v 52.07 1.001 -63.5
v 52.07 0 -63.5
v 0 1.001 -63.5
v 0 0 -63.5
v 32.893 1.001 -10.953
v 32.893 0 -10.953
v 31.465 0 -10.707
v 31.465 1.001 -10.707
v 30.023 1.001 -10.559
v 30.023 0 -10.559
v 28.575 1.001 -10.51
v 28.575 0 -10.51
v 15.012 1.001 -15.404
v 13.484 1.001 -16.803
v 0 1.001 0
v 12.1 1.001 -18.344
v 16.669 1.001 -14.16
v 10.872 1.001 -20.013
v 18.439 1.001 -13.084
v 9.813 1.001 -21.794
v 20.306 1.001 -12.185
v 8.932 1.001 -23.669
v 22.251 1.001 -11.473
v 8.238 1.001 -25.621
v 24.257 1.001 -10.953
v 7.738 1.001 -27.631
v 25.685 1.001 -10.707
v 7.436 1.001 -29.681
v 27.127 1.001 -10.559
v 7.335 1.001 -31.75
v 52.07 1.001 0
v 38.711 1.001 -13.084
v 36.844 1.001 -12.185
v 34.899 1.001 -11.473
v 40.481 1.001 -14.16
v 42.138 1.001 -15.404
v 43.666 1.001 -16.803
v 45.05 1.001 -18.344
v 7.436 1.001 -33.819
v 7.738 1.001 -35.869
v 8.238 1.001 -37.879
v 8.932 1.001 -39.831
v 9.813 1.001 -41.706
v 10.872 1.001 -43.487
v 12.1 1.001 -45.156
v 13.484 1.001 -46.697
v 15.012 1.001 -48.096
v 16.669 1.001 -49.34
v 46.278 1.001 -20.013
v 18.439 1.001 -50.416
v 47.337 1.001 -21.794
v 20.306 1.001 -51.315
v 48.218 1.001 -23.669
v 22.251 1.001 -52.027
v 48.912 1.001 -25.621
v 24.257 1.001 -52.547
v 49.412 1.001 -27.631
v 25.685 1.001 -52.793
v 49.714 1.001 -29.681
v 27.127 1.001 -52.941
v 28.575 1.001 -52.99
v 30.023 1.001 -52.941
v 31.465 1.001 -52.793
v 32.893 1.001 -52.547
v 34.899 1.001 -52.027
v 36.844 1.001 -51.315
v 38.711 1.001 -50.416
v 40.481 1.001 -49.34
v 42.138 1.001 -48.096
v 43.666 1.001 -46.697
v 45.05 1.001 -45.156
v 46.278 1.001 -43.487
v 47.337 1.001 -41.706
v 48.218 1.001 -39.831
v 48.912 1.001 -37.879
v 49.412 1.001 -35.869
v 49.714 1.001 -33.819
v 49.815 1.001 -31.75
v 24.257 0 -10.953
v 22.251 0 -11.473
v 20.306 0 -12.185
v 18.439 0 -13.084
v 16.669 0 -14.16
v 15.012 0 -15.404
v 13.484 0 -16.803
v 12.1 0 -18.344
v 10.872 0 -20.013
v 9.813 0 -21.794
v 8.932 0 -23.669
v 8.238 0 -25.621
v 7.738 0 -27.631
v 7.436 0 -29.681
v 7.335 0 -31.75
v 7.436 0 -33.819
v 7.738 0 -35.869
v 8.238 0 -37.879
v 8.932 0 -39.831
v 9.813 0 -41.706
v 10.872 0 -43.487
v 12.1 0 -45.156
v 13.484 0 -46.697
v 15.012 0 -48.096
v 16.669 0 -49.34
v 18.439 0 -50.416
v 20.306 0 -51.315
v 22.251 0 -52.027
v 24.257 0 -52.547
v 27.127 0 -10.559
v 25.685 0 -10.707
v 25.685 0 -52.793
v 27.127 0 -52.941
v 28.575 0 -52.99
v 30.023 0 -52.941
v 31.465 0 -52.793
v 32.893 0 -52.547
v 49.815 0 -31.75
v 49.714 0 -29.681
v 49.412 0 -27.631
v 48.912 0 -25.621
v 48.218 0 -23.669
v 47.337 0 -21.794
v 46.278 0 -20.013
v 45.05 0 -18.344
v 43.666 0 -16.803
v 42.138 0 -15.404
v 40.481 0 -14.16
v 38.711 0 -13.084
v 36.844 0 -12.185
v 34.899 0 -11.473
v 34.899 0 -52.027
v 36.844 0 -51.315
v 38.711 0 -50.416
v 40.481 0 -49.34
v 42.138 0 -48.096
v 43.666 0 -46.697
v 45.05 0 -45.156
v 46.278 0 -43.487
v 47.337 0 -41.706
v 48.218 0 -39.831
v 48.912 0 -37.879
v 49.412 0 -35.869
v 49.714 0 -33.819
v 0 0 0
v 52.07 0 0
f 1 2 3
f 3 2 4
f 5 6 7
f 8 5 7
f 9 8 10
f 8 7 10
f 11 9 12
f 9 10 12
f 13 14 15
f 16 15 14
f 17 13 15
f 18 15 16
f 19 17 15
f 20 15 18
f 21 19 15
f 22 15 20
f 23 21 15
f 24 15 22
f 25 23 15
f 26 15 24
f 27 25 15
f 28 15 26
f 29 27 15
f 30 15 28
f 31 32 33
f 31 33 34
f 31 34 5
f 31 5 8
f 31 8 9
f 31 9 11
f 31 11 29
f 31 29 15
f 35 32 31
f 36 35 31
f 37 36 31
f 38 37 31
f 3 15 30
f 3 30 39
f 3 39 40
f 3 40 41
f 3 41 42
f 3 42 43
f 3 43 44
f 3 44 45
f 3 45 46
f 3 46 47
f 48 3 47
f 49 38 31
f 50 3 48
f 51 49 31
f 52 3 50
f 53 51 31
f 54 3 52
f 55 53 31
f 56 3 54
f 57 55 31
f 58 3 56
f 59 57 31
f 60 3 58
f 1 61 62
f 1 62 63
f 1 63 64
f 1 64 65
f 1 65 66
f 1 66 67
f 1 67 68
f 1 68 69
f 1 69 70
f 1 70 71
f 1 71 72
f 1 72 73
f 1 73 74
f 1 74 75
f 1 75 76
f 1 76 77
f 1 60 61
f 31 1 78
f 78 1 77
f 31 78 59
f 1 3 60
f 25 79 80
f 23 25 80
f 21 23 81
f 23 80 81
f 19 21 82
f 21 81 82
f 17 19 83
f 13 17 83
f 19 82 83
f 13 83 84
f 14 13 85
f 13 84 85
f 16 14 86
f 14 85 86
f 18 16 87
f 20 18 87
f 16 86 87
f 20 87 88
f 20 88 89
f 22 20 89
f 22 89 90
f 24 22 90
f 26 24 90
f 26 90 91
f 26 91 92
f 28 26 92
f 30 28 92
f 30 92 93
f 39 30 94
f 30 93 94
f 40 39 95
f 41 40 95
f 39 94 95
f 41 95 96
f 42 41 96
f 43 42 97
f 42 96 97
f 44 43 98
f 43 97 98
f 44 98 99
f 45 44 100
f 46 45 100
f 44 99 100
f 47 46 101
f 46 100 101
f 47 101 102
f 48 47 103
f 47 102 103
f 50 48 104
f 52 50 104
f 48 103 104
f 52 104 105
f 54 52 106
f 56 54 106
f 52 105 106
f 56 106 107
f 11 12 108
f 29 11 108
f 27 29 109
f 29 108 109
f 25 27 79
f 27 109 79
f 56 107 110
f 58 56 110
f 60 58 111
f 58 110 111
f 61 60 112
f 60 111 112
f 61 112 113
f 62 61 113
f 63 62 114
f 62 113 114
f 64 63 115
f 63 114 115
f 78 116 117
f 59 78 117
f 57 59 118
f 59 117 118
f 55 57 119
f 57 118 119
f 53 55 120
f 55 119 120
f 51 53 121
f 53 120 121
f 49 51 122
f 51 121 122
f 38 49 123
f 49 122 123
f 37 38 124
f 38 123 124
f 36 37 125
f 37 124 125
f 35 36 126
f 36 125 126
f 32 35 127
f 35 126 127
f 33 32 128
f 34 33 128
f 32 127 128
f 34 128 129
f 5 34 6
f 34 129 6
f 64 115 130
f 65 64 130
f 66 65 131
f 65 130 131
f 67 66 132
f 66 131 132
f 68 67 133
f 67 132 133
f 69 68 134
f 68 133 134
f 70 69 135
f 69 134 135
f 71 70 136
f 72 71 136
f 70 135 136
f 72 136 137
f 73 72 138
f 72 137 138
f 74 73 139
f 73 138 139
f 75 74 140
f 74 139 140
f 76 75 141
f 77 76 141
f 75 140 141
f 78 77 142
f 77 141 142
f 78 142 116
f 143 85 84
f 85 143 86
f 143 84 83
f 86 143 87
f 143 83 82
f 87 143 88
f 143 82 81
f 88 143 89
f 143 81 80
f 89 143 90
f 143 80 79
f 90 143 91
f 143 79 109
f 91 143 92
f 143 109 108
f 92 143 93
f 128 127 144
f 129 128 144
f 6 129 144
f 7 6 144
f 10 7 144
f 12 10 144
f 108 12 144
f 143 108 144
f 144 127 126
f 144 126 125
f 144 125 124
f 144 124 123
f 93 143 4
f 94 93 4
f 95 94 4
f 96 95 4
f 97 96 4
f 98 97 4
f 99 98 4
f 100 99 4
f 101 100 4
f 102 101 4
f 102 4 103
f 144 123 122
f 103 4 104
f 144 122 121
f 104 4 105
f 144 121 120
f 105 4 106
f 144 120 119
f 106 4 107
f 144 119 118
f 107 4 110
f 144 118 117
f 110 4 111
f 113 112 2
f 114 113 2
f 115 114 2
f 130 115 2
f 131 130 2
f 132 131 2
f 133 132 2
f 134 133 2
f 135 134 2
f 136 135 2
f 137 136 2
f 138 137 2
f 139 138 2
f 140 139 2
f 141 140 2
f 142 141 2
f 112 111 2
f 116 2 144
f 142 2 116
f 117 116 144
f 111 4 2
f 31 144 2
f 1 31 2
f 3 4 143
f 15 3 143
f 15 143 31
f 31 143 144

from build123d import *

# Parameters (mm, degrees)
BOSS_EXTRUDE1_DEPTH = 1.00076


with BuildPart() as part:
    # Sketch3 → Boss-Extrude1 (new body)
    with BuildSketch(Plane(origin=(0, 0, 0), x_dir=(1, 0, 0), z_dir=(0, 1, 0))):
        with BuildLine():
            Line((0, 63.5), (0, 0))
            Line((0, 0), (24.257, 0))
            Line((24.257, 0), (24.257, 10.953386454))
            ThreePointArc((24.257, 10.953386454), (7.334843244, 31.75), (24.257, 52.546613546))
            Line((24.257, 52.546613546), (24.257, 63.5))
            Line((24.257, 63.5), (0, 63.5))
        make_face()
        with BuildLine():
            Line((32.893, 10.953386454), (32.893, 0))
            Line((32.893, 0), (52.07, 0))
            Line((52.07, 0), (52.07, 63.5))
            Line((52.07, 63.5), (32.893, 63.5))
            Line((32.893, 63.5), (32.893, 52.546613546))
            ThreePointArc((32.893, 52.546613546), (45.050121485, 45.155768574), (49.815156756, 31.75))
            ThreePointArc((49.815156756, 31.75), (45.050121485, 18.344231426), (32.893, 10.953386454))
        make_face()
        with BuildLine():
            Line((28.575, 10.509843244), (28.575, 0))
            Line((28.575, 0), (32.893, 0))
            Line((32.893, 0), (32.893, 10.953386454))
            ThreePointArc((32.893, 10.953386454), (30.745360257, 10.621020011), (28.575, 10.509843244))
        make_face()
        with BuildLine():
            Line((24.257, 10.953386454), (24.257, 0))
            Line((24.257, 0), (28.575, 0))
            Line((28.575, 0), (28.575, 10.509843244))
            ThreePointArc((28.575, 10.509843244), (26.404639743, 10.621020011), (24.257, 10.953386454))
        make_face()
        with BuildLine():
            Line((32.893, 63.5), (28.575, 63.5))
            Line((28.575, 63.5), (28.575, 52.990156756))
            ThreePointArc((28.575, 52.990156756), (30.745360257, 52.878979989), (32.893, 52.546613546))
            Line((32.893, 52.546613546), (32.893, 63.5))
        make_face()
        with BuildLine():
            Line((28.575, 63.5), (24.257, 63.5))
            Line((24.257, 63.5), (24.257, 52.546613546))
            ThreePointArc((24.257, 52.546613546), (26.404639743, 52.878979989), (28.575, 52.990156756))
            Line((28.575, 52.990156756), (28.575, 63.5))
        make_face()
    extrude(amount=BOSS_EXTRUDE1_DEPTH)


solid = part.part
